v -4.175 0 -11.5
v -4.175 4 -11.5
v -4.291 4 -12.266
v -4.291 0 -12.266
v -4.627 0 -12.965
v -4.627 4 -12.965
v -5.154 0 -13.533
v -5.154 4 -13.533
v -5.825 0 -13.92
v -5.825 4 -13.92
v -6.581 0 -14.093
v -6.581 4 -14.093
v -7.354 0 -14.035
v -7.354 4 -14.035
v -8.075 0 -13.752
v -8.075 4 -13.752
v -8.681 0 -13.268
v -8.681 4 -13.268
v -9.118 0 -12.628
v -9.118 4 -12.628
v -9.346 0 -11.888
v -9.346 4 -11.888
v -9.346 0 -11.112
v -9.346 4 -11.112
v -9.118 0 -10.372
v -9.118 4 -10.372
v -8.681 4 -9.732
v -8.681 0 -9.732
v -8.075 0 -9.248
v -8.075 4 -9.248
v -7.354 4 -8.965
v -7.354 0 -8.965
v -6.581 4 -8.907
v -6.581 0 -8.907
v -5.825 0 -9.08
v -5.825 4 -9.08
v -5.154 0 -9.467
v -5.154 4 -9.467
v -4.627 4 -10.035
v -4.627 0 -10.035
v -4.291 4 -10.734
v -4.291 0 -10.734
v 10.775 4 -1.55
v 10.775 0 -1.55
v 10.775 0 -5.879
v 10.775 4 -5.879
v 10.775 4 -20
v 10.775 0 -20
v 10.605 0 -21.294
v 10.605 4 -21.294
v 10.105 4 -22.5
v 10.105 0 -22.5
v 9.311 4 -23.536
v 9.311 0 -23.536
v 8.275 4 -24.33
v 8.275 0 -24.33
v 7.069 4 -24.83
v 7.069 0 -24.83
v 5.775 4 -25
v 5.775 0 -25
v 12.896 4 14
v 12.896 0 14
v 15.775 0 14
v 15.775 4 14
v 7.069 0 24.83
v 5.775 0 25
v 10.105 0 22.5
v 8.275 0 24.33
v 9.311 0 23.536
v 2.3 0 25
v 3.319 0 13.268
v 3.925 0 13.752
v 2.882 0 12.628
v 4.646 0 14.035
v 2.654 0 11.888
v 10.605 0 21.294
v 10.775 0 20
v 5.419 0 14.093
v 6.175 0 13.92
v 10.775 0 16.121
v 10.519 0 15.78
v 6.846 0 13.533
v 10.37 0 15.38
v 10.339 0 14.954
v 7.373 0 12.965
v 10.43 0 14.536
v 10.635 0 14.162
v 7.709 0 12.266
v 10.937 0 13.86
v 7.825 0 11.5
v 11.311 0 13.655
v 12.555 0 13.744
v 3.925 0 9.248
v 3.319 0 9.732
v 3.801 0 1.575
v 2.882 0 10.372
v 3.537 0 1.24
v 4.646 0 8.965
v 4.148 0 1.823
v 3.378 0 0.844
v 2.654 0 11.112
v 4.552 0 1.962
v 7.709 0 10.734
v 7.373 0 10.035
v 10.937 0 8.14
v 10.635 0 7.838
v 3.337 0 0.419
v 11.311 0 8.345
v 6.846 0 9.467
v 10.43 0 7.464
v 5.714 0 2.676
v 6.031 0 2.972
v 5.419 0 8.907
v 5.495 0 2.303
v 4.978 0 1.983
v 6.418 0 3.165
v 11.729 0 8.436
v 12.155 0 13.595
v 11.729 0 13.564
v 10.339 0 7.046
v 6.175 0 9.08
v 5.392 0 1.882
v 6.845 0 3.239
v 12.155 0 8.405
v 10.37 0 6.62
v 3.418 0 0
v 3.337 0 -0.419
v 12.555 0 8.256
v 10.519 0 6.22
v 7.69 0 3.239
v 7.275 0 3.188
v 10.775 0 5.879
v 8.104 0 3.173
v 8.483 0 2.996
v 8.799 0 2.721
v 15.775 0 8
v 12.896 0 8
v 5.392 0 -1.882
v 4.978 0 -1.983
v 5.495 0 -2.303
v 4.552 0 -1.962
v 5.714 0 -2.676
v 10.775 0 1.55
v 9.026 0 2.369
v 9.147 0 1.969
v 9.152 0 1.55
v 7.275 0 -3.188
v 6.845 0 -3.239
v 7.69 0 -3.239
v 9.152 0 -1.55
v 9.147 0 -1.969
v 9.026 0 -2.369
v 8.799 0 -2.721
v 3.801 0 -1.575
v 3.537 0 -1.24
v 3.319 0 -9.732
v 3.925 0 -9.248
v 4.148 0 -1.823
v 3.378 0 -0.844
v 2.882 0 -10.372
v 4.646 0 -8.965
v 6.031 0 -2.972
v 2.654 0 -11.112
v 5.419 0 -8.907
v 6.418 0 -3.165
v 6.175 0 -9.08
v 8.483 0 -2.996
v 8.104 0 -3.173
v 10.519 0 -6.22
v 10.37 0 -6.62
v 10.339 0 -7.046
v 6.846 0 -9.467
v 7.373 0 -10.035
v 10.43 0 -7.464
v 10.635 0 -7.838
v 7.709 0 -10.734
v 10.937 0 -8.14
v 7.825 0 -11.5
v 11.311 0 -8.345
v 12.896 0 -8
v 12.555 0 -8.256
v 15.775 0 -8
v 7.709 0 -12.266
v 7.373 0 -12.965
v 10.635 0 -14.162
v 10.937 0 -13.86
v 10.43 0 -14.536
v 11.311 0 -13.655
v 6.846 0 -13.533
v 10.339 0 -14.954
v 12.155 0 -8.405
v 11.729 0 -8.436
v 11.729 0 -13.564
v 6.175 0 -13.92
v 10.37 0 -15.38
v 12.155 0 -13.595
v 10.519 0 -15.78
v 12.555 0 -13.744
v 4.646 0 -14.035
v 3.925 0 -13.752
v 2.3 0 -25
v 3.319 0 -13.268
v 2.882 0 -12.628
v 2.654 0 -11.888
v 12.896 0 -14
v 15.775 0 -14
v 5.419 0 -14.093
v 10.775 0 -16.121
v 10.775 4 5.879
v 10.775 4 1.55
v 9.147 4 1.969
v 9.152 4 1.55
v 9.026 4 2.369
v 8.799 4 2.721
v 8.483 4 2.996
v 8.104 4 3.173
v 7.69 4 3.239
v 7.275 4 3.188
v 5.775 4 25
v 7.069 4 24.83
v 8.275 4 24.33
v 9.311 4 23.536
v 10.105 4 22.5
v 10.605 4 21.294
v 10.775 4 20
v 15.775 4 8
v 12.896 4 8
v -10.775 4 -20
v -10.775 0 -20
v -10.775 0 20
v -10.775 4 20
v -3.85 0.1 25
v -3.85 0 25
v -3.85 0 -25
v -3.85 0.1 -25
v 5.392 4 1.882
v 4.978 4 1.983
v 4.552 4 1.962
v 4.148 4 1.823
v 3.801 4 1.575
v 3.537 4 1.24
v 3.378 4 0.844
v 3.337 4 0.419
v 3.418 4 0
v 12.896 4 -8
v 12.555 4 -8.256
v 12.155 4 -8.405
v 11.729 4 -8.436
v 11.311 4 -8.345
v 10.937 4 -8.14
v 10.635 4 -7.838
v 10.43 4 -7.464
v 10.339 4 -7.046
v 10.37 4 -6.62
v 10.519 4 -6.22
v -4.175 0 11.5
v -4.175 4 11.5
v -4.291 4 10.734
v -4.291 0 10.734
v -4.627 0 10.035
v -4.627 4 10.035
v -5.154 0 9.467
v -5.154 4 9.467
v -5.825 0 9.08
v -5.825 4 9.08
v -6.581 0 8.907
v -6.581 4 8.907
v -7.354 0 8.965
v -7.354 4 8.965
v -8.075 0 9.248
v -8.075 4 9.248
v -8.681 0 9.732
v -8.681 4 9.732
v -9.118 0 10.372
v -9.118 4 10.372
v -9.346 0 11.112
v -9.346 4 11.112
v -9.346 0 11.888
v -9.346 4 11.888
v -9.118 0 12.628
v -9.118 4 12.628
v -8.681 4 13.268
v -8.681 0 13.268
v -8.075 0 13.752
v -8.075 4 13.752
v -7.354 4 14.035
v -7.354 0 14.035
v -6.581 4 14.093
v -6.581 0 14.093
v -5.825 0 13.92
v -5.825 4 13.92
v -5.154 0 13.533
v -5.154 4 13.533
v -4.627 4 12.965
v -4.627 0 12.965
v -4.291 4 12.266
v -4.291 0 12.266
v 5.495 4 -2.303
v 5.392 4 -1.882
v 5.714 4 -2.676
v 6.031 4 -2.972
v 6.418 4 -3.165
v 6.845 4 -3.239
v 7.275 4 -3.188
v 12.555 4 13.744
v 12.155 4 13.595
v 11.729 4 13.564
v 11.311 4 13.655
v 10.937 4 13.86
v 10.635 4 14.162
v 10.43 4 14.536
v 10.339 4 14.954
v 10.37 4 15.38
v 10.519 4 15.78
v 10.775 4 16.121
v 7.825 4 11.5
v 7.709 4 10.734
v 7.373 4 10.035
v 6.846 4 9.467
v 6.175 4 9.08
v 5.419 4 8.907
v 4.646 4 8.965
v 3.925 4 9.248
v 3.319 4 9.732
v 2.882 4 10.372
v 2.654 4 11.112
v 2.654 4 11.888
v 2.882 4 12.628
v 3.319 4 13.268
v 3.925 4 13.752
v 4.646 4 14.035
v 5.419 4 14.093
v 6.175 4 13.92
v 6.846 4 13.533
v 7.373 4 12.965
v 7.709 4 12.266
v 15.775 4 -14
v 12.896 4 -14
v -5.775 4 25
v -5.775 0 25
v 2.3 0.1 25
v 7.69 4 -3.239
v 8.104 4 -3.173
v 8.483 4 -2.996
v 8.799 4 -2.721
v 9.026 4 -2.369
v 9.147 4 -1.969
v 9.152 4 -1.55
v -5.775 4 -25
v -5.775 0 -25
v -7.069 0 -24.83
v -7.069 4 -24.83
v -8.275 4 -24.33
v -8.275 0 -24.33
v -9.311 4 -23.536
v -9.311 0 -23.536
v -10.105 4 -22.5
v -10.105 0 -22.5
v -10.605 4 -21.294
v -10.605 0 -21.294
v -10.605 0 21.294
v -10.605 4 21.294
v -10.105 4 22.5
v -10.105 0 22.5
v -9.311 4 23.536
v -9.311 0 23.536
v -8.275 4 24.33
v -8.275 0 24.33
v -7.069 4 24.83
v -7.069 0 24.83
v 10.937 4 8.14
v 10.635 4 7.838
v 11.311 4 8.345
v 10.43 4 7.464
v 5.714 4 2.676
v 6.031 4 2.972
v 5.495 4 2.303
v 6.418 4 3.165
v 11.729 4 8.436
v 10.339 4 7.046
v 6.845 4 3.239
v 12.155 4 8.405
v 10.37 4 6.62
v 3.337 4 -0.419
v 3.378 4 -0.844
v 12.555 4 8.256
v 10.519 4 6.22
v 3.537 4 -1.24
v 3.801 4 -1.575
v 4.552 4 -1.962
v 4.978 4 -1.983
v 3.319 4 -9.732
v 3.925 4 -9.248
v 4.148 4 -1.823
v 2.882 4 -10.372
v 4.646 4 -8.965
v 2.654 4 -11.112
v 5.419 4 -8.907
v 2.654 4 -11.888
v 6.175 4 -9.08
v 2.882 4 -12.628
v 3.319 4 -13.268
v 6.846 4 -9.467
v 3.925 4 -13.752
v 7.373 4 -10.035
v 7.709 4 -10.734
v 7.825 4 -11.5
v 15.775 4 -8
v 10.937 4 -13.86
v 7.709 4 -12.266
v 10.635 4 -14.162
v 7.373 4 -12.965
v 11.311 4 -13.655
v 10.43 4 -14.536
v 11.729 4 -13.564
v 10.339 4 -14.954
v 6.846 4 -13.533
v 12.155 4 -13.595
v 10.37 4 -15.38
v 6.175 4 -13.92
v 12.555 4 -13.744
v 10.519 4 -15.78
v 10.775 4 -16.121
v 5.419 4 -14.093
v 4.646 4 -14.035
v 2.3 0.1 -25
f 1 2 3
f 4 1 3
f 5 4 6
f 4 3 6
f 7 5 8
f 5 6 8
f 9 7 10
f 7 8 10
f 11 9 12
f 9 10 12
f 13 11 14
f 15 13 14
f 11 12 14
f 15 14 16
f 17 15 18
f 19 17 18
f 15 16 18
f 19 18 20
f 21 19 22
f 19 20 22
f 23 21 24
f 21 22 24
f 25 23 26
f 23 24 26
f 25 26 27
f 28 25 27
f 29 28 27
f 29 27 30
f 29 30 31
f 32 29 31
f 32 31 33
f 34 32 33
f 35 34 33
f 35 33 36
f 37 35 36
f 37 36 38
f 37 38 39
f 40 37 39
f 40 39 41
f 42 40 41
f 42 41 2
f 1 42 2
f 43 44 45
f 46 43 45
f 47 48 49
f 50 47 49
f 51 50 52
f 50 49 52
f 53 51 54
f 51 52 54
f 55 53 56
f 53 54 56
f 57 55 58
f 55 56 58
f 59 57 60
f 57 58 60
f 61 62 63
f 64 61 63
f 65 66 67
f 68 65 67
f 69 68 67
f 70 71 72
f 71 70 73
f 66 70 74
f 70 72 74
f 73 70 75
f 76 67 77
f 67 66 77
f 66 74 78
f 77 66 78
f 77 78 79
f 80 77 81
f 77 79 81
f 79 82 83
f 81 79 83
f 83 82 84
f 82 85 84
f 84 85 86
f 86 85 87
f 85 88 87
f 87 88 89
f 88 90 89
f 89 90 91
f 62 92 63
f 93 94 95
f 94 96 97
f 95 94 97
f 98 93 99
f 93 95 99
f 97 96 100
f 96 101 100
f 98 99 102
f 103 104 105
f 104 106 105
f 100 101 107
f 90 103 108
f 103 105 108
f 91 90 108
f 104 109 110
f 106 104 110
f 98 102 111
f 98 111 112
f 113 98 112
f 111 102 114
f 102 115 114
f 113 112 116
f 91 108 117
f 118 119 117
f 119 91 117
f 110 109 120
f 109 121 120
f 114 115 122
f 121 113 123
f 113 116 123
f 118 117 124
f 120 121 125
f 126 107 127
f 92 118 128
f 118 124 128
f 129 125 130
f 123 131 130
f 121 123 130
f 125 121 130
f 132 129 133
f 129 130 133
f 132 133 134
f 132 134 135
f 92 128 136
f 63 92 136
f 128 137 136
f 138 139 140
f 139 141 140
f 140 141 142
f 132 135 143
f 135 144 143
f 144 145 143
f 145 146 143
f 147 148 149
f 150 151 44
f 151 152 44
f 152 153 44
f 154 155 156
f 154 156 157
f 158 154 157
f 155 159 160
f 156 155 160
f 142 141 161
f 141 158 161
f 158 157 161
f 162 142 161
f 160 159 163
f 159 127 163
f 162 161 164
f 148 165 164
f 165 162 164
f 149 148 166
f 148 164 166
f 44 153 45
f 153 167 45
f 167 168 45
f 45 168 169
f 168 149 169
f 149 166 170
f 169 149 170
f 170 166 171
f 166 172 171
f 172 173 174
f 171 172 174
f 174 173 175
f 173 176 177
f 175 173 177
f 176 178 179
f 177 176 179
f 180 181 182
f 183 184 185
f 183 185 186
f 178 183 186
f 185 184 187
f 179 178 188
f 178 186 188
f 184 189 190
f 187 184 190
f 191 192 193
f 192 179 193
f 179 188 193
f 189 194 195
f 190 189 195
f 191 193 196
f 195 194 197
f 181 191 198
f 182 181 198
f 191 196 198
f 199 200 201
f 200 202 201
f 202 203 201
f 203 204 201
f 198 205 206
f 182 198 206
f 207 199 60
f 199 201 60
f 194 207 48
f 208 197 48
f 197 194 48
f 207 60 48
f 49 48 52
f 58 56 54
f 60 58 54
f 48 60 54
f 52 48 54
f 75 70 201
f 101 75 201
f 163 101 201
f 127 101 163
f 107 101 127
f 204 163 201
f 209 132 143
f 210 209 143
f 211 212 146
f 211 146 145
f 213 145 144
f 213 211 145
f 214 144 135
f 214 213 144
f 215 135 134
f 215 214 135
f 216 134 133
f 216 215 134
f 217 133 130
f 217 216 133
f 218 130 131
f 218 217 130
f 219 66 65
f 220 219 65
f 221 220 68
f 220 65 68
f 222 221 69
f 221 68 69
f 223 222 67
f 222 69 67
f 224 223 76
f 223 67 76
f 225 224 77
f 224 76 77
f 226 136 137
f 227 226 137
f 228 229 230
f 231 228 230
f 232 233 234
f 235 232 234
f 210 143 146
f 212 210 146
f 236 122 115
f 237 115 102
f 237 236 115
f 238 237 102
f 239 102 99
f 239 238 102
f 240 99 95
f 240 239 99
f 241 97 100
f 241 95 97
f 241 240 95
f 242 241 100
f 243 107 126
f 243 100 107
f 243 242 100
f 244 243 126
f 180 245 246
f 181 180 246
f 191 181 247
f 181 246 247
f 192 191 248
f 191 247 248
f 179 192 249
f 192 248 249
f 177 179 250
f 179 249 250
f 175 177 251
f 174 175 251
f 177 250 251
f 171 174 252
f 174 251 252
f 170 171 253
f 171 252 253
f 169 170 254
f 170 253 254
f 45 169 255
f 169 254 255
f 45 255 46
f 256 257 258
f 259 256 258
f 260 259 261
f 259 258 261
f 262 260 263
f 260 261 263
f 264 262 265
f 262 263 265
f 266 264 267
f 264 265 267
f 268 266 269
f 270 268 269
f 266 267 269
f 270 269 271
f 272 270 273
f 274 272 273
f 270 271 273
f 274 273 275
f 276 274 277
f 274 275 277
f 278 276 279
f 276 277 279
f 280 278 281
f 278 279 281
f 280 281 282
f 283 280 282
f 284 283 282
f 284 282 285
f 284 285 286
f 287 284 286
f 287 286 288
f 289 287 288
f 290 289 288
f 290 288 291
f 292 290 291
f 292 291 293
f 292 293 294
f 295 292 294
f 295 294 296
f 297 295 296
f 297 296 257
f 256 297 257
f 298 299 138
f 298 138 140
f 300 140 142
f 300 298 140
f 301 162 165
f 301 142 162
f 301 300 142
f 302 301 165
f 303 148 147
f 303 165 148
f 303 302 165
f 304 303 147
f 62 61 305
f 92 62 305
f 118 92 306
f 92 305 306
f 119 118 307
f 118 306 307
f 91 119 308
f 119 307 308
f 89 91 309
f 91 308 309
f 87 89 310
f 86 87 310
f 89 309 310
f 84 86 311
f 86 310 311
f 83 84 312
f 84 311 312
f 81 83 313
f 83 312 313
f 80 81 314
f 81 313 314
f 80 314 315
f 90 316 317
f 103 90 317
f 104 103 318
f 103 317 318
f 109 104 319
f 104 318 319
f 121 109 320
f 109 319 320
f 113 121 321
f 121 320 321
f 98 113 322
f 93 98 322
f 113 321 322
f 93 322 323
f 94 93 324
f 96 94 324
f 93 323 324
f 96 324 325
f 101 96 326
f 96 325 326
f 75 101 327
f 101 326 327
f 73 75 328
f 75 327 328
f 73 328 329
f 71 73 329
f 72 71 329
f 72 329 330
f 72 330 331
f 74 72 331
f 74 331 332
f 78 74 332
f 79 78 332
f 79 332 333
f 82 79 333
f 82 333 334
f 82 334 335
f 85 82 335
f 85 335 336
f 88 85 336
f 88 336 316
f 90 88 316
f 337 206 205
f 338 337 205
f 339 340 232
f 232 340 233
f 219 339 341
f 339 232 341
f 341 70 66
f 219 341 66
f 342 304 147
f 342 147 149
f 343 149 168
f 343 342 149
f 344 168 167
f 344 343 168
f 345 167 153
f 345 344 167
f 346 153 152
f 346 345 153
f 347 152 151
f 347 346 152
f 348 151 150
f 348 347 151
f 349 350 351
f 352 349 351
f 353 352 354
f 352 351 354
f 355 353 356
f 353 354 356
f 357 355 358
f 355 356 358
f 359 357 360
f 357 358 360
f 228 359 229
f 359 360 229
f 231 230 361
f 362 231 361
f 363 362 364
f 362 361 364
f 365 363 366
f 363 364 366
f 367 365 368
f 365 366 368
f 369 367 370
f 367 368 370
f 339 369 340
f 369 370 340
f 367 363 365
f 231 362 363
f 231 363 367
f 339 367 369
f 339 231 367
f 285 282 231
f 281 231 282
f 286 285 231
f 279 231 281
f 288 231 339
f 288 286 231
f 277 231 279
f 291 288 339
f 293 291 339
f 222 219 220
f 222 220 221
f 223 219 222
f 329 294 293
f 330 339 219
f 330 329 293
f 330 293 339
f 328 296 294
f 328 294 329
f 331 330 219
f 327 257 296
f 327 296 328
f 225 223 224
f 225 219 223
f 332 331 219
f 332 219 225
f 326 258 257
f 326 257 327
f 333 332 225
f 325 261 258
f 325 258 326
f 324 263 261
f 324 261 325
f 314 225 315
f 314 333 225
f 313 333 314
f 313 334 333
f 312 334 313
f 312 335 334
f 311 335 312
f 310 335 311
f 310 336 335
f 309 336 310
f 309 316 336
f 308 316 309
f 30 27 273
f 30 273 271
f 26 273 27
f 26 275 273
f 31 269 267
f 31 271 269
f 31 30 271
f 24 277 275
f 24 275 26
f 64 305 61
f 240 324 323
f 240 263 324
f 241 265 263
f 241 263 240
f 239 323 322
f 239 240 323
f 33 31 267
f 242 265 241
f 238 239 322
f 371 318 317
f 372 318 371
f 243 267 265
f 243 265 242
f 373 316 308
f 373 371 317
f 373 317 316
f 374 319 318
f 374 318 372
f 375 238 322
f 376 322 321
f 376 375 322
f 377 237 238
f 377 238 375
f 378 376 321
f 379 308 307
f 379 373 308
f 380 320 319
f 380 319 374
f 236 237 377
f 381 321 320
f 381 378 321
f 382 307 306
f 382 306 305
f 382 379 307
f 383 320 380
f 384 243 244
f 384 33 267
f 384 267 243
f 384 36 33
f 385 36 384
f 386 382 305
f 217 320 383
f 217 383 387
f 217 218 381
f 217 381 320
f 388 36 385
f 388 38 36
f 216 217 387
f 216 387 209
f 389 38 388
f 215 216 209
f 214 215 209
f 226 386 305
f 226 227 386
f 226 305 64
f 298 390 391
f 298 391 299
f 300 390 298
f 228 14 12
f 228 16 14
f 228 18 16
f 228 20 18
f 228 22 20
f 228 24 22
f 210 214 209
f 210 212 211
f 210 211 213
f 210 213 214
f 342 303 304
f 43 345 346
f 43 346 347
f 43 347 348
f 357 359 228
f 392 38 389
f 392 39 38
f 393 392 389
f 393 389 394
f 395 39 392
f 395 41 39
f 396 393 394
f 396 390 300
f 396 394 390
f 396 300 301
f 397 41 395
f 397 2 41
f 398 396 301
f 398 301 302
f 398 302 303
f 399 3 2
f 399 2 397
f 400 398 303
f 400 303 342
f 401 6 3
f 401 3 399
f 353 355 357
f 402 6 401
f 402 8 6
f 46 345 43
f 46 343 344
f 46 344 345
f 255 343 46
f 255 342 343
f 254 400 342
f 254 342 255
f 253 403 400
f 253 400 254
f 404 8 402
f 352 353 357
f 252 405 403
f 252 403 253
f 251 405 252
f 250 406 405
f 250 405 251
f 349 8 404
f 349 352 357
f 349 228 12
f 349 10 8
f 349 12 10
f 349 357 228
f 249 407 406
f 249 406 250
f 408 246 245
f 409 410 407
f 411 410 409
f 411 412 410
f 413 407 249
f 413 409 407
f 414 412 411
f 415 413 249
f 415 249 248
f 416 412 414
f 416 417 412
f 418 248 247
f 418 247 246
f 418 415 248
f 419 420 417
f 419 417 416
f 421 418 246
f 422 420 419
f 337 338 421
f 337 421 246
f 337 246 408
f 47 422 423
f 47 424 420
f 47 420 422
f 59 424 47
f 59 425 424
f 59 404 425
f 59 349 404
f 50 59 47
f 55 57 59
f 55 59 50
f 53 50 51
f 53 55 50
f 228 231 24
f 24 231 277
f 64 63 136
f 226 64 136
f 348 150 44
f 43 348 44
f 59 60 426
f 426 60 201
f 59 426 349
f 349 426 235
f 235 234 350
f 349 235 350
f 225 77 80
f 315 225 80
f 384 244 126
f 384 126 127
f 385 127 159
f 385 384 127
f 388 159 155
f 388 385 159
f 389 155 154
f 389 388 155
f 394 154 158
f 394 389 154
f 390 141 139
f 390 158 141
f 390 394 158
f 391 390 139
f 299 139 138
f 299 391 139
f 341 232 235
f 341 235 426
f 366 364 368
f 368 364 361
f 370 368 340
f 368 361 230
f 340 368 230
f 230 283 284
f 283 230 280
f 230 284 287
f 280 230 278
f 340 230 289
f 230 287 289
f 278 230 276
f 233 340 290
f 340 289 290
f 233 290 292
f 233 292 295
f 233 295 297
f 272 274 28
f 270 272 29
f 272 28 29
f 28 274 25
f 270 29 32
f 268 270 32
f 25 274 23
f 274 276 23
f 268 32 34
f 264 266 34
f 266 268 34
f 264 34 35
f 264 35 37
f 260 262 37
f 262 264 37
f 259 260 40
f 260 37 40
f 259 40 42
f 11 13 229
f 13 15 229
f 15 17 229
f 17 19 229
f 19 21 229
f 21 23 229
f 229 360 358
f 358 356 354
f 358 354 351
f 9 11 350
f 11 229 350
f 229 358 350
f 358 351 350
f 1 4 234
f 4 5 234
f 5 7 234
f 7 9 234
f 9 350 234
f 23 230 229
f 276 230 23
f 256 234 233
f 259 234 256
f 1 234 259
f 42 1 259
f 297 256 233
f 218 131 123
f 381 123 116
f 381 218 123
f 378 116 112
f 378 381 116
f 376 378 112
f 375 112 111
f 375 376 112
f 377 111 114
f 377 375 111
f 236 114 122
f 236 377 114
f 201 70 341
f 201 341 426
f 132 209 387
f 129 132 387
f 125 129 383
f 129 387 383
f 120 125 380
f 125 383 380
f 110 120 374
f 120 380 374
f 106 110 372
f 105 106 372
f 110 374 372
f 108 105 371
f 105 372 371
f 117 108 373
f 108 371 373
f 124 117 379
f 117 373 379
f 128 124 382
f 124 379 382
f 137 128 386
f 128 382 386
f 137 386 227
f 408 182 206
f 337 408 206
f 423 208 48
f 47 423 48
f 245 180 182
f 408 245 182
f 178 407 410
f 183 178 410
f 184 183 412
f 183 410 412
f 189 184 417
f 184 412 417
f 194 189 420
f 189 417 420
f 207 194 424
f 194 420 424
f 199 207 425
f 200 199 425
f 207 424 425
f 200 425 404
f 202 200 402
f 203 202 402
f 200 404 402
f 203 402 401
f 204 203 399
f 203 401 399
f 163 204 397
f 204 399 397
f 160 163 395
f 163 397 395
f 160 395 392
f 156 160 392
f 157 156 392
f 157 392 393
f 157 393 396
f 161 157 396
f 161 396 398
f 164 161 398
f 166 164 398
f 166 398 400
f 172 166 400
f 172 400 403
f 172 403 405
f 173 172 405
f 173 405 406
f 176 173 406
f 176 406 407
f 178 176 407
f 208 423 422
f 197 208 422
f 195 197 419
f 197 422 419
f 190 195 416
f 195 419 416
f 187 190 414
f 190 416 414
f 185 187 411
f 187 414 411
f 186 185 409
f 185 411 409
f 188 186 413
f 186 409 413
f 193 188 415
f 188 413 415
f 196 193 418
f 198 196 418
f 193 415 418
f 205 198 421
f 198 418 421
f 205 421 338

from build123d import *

# Parameters (mm, degrees)
SALIENTE_EXTRUIR1_DEPTH = 4
CROQUIS5_R              = 2.6
CORTAR_EXTRUIR3_DEPTH   = 5
CORTAR_EXTRUIR4_DEPTH   = 5
CROQUIS10_R             = 1.5
CORTAR_EXTRUIR5_DEPTH   = 5
CROQUIS4_W              = 6.15
CROQUIS4_H              = 53
CORTAR_EXTRUIR6_DEPTH   = 0.1


with BuildPart() as part:
    # Croquis1 → Saliente-Extruir1 (new body)
    with BuildSketch(Plane(origin=(0, 0, 0), x_dir=(1, 0, 0), z_dir=(0, 1, 0))):
        with BuildLine():
            Line((-5.775, -25), (5.775, -25))
            ThreePointArc((5.775, -25), (9.310533906, -23.535533906), (10.775, -20))
            Line((10.775, -20), (10.775, -14))
            Line((10.775, -14), (15.775, -14))
            Line((15.775, -14), (15.775, -8))
            Line((15.775, -8), (10.775, -8))
            Line((10.775, -8), (10.775, -1.55))
            Line((10.775, -1.55), (8.725, -1.55))
            Line((8.725, -1.55), (8.725, -2.8))
            Line((8.725, -2.8), (5.825, -2.8))
            Line((5.825, -2.8), (5.825, -1.55))
            Line((5.825, -1.55), (3.775, -1.55))
            Line((3.775, -1.55), (3.775, 1.55))
            Line((3.775, 1.55), (5.825, 1.55))
            Line((5.825, 1.55), (5.825, 2.8))
            Line((5.825, 2.8), (8.725, 2.8))
            Line((8.725, 2.8), (8.725, 1.55))
            Line((8.725, 1.55), (10.775, 1.55))
            Line((10.775, 1.55), (10.775, 8))
            Line((10.775, 8), (15.775, 8))
            Line((15.775, 8), (15.775, 14))
            Line((15.775, 14), (10.775, 14))
            Line((10.775, 14), (10.775, 20))
            ThreePointArc((10.775, 20), (9.310533906, 23.535533906), (5.775, 25))
            Line((5.775, 25), (-5.775, 25))
            ThreePointArc((-5.775, 25), (-9.310533906, 23.535533906), (-10.775, 20))
            Line((-10.775, 20), (-10.775, -20))
            ThreePointArc((-10.775, -20), (-9.310533906, -23.535533906), (-5.775, -25))
        make_face()
    extrude(amount=SALIENTE_EXTRUIR1_DEPTH)

    # Croquis5 → Cortar-Extruir3 (cut, through all)
    with BuildSketch(Plane(origin=(0, 4, 0), x_dir=(1, 0, 0), z_dir=(0, 1, 0))):
        with Locations((-6.775, 11.5)):
            Circle(CROQUIS5_R)
        with Locations((5.225, 11.5)):
            Circle(CROQUIS5_R)
        with Locations((5.225, -11.5)):
            Circle(CROQUIS5_R)
        with Locations((-6.775, -11.5)):
            Circle(CROQUIS5_R)
    extrude(amount=-CORTAR_EXTRUIR3_DEPTH, mode=Mode.SUBTRACT)

    # Croquis7 → Cortar-Extruir4 (cut, through all)
    with BuildSketch(Plane(origin=(0, 4, 0), x_dir=(1, 0, 0), z_dir=(0, 1, 0))):
        with BuildLine():
            Line((9.152341989, 1.55), (10.775, 1.55))
            Line((10.775, 1.55), (10.775, -1.55))
            Line((10.775, -1.55), (9.152341989, -1.55))
            ThreePointArc((9.152341989, -1.55), (8.650478098, -2.869619136), (7.275, -3.187930349))
            ThreePointArc((7.275, -3.187930349), (6.030747615, -2.971867524), (5.392475162, -1.882163243))
            ThreePointArc((5.392475162, -1.882163243), (3.80076038, -1.575149398), (3.41772275, 0))
            ThreePointArc((3.41772275, 0), (3.80076038, 1.575149398), (5.392475162, 1.882163243))
            ThreePointArc((5.392475162, 1.882163243), (6.030747615, 2.971867524), (7.275, 3.187930349))
            ThreePointArc((7.275, 3.187930349), (8.650478098, 2.869619136), (9.152341989, 1.55))
        make_face()
    extrude(amount=-CORTAR_EXTRUIR4_DEPTH, mode=Mode.SUBTRACT)

    # Croquis10 → Cortar-Extruir5 (cut, through all)
    with BuildSketch(Plane(origin=(0, 4, 0), x_dir=(1, 0, 0), z_dir=(0, 1, 0))):
        with Locations((11.835660172, 15.060660172)):
            Circle(CROQUIS10_R)
        with Locations((11.835660172, 6.939339828)):
            Circle(CROQUIS10_R)
        with Locations((11.835660172, -15.060660172)):
            Circle(CROQUIS10_R)
        with Locations((11.835660172, -6.939339828)):
            Circle(CROQUIS10_R)
    extrude(amount=-CORTAR_EXTRUIR5_DEPTH, mode=Mode.SUBTRACT)

    # Croquis4 → Cortar-Extruir6 (cut)
    with BuildSketch(Plane(origin=(0, 0, 0), x_dir=(1, 0, 0), z_dir=(0, 1, 0))):
        with Locations((-0.775, 0)):
            Rectangle(CROQUIS4_W, CROQUIS4_H)
    extrude(amount=CORTAR_EXTRUIR6_DEPTH, mode=Mode.SUBTRACT)


solid = part.part
